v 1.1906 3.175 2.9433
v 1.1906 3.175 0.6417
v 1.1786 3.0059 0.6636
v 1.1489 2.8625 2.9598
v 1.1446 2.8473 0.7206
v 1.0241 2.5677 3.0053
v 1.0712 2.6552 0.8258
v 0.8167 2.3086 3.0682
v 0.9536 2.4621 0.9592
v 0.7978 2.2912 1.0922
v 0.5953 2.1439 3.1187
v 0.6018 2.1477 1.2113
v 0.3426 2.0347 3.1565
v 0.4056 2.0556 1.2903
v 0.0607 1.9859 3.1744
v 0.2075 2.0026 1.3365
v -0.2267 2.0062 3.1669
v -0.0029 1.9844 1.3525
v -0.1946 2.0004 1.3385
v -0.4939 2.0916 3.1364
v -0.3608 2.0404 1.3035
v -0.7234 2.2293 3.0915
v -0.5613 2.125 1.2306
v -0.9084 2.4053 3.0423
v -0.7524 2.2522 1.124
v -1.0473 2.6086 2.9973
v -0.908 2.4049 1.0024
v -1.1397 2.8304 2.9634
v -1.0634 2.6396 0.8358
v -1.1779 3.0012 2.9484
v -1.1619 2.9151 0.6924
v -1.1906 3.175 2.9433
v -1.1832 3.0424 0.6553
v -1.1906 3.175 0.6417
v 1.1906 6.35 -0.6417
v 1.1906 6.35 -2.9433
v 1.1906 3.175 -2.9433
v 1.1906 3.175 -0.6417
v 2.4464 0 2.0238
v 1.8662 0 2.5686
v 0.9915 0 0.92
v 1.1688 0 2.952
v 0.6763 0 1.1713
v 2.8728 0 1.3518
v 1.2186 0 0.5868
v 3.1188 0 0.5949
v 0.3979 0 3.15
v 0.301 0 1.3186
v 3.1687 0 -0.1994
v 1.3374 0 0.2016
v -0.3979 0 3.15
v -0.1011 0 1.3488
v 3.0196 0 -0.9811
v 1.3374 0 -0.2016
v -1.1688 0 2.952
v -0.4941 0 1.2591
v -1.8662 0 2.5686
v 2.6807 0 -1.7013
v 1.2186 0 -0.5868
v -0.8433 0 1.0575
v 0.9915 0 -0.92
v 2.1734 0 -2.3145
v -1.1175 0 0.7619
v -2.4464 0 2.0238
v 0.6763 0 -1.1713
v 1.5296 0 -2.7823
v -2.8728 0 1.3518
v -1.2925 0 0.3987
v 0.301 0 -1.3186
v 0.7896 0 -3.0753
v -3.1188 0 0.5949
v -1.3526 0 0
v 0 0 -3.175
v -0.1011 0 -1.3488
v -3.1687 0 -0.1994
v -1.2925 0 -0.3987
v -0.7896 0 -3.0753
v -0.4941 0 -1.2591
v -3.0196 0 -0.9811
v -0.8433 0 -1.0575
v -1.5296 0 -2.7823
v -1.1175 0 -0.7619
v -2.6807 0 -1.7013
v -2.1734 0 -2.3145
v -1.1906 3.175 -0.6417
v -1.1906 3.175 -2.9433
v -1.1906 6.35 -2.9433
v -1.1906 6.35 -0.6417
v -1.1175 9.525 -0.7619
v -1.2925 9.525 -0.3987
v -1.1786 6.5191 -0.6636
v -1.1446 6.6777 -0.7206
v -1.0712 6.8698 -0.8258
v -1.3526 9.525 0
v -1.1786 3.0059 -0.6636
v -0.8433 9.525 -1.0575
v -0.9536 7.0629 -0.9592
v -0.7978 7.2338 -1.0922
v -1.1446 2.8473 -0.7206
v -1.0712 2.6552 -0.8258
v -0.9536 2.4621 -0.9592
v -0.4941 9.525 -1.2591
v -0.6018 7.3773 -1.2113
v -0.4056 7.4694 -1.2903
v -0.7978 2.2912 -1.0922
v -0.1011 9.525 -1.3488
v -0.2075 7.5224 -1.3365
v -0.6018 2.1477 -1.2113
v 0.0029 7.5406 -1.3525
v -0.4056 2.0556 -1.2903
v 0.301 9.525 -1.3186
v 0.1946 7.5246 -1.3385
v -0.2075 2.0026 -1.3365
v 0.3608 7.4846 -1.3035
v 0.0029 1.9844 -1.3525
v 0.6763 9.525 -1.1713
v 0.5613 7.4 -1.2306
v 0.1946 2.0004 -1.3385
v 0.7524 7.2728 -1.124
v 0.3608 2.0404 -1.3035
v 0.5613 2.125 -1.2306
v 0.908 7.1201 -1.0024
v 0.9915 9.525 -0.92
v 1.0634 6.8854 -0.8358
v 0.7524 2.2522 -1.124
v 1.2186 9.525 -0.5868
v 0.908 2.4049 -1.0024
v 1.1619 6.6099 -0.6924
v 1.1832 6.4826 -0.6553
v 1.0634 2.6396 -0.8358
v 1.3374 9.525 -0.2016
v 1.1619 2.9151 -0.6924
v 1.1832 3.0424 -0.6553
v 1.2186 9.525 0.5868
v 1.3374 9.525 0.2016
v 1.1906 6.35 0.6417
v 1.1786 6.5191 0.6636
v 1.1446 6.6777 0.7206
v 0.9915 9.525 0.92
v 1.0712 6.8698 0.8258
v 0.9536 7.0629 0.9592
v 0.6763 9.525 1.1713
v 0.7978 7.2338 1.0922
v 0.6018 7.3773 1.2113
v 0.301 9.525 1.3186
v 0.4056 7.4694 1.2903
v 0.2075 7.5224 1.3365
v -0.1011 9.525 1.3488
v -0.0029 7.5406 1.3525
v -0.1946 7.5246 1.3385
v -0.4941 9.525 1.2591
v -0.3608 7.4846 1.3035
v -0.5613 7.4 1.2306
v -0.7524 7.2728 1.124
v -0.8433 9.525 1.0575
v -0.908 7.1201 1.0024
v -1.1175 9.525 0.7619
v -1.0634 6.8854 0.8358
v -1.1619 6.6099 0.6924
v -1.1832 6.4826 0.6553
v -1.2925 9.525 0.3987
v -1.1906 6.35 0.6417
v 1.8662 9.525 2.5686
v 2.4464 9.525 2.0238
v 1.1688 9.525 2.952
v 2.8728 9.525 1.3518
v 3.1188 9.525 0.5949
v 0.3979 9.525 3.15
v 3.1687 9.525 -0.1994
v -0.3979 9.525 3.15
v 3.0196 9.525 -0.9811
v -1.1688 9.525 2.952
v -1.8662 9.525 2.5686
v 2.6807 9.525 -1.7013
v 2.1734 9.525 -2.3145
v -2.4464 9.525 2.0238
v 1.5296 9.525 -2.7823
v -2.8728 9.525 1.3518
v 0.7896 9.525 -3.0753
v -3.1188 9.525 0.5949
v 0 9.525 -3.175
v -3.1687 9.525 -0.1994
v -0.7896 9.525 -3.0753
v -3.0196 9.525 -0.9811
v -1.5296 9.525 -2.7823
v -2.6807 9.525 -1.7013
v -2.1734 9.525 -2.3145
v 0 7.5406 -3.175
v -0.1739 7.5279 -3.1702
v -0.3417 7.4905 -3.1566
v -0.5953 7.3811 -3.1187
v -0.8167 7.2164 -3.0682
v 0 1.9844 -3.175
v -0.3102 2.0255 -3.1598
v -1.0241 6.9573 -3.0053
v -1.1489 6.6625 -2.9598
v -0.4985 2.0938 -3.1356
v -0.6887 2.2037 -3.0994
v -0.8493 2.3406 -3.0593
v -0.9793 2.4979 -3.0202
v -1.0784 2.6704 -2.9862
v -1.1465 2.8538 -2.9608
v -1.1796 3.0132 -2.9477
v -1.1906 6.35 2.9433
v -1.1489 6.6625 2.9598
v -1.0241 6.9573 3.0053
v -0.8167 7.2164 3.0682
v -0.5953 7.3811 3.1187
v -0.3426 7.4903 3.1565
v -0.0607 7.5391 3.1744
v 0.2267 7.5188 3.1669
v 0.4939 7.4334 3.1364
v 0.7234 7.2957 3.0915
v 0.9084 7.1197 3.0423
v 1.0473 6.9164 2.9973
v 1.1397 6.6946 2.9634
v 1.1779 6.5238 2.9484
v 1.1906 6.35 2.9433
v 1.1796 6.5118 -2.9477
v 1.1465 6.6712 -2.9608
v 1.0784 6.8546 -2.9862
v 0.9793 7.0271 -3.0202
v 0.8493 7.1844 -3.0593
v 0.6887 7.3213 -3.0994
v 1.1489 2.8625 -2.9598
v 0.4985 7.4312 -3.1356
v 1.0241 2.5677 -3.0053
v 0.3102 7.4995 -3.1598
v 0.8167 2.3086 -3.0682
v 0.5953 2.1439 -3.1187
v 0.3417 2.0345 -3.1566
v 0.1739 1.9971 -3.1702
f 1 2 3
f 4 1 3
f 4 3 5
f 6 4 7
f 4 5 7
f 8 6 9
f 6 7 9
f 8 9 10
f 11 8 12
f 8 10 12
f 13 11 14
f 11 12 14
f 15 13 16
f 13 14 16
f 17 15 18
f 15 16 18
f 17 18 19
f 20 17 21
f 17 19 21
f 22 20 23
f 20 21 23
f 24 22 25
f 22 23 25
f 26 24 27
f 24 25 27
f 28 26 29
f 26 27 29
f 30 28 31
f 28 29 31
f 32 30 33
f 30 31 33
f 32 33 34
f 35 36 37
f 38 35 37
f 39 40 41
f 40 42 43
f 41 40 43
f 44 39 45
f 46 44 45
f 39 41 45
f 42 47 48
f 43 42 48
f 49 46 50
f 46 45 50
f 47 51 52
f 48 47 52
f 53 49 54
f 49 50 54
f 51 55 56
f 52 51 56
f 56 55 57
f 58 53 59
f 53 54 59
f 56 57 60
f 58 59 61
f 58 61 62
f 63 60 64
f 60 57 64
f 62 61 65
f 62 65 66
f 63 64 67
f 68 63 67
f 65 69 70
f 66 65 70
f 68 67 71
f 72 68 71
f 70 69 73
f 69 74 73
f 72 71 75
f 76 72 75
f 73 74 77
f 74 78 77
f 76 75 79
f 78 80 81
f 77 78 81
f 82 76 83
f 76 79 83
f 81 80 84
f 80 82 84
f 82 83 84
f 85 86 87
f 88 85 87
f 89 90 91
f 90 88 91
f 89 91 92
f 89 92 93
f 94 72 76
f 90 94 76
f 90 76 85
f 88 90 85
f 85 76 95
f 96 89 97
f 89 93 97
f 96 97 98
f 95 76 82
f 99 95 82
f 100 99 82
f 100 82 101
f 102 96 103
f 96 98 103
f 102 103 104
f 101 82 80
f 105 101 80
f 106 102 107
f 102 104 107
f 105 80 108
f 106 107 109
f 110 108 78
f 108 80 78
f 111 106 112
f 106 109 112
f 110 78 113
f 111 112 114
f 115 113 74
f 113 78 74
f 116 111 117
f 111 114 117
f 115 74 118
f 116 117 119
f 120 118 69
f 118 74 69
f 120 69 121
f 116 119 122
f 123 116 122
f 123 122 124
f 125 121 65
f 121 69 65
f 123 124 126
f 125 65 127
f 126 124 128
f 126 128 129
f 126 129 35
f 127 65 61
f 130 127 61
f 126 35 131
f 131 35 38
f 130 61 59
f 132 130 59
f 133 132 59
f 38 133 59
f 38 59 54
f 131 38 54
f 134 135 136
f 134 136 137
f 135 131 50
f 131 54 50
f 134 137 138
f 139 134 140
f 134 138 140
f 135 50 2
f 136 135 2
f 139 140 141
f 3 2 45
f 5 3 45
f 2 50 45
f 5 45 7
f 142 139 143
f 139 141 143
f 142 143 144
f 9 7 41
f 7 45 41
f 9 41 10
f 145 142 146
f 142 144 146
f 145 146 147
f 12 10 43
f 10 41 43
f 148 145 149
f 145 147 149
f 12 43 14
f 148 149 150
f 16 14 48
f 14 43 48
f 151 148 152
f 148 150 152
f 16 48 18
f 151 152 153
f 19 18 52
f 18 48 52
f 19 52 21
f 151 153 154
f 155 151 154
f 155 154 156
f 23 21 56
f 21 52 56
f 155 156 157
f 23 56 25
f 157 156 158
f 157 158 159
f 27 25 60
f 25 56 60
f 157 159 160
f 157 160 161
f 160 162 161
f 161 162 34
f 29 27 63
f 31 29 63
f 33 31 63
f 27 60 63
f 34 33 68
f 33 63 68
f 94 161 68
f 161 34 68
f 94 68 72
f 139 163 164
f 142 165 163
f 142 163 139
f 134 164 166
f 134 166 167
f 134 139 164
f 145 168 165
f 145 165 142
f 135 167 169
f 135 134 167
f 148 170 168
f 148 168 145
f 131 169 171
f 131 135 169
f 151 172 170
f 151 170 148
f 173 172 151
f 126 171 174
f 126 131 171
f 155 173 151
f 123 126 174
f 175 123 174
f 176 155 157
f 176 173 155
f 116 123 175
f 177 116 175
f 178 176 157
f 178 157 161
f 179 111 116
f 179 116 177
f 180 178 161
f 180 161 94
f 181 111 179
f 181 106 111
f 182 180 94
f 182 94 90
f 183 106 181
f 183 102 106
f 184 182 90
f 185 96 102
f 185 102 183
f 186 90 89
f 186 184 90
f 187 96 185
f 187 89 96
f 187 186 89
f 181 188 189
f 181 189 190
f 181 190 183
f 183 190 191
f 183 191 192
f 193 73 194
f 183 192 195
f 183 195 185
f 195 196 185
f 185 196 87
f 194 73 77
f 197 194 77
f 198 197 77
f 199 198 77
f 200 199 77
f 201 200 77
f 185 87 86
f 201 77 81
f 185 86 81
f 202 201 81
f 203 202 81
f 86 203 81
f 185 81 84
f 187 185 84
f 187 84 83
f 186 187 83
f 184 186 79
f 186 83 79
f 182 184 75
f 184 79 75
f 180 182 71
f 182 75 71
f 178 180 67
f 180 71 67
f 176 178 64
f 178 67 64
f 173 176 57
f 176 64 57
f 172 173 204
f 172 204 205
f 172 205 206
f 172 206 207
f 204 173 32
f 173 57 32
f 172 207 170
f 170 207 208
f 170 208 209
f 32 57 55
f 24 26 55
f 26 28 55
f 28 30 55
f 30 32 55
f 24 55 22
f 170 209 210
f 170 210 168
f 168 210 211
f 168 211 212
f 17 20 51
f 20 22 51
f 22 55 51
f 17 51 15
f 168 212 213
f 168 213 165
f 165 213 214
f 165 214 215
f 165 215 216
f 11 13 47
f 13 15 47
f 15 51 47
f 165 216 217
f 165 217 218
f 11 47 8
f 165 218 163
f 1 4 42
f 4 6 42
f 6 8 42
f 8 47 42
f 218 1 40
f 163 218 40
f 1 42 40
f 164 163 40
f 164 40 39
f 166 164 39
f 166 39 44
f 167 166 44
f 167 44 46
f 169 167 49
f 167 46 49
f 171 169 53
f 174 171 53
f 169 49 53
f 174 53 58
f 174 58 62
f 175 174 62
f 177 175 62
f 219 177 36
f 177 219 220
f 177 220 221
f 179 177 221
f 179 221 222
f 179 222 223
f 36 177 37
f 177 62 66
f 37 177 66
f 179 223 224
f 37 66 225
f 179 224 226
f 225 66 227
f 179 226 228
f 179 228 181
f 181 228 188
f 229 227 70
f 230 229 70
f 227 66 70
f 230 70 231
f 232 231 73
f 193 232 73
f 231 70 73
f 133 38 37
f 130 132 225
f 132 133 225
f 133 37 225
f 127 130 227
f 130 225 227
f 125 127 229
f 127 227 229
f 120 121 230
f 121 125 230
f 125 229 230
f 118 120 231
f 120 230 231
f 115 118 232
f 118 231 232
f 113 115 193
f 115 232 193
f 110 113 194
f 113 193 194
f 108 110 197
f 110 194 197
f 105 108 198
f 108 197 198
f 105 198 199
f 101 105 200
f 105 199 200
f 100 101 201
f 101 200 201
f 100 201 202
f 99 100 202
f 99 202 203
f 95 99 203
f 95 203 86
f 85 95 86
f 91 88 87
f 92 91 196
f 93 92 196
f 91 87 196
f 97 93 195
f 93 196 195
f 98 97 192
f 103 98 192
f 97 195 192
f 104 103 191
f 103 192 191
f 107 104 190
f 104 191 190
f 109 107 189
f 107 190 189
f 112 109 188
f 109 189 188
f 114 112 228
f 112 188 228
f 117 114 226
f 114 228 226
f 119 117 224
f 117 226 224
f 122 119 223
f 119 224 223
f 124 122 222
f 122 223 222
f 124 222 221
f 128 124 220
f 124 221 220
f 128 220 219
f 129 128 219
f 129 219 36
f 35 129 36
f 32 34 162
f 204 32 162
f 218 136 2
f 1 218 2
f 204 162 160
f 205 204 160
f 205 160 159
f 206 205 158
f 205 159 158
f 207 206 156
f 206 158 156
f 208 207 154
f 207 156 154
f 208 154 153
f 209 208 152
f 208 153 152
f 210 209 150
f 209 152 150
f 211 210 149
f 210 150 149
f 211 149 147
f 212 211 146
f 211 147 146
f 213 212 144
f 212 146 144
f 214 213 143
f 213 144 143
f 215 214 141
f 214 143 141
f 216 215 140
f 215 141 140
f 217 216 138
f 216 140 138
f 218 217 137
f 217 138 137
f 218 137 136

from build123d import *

# Parameters (mm, degrees)
SKETCH1_R                 = 3.175
BOSS_EXTRUDE1_DEPTH       = 9.525
TAP_DRILL_FOR_6_32_TAP1_D = 2.7051
CUT_EXTRUDE1_DEPTH        = 11.530283709
CUT_EXTRUDE1_DEPTH_BACK   = 11.530283709


with BuildPart() as part:
    # Sketch1 → Boss-Extrude1 (new body)
    with BuildSketch(Plane(origin=(0, 0, 0), x_dir=(1, 0, 0), z_dir=(0, 1, 0))):
        with Locations(Location((0, 0, 0), (0, 0, 90))):
            Circle(SKETCH1_R)
    extrude(amount=BOSS_EXTRUDE1_DEPTH)

    # Tap Drill for #6-32 Tap1 (through all)
    with Locations(Plane(origin=(0, 9.525, 0), x_dir=(1, 0, 0), z_dir=(0, 1, 0))):
        with Locations((0, 0)):
            Hole(TAP_DRILL_FOR_6_32_TAP1_D / 2)

    # Sketch4 → Cut-Extrude1 (cut, two sides: drawn at the far end of the back side and taken through both)
    with BuildSketch(Plane.XY.offset(-CUT_EXTRUDE1_DEPTH_BACK)):
        with BuildLine():
            Line((1.190625, 6.35), (1.190625, 3.175))
            ThreePointArc((1.190625, 3.175), (0, 1.984375), (-1.190625, 3.175))
            Line((-1.190625, 3.175), (-1.190625, 6.35))
            ThreePointArc((-1.190625, 6.35), (0, 7.540625), (1.190625, 6.35))
        make_face()
    extrude(amount=CUT_EXTRUDE1_DEPTH + CUT_EXTRUDE1_DEPTH_BACK, mode=Mode.SUBTRACT)


solid = part.part
